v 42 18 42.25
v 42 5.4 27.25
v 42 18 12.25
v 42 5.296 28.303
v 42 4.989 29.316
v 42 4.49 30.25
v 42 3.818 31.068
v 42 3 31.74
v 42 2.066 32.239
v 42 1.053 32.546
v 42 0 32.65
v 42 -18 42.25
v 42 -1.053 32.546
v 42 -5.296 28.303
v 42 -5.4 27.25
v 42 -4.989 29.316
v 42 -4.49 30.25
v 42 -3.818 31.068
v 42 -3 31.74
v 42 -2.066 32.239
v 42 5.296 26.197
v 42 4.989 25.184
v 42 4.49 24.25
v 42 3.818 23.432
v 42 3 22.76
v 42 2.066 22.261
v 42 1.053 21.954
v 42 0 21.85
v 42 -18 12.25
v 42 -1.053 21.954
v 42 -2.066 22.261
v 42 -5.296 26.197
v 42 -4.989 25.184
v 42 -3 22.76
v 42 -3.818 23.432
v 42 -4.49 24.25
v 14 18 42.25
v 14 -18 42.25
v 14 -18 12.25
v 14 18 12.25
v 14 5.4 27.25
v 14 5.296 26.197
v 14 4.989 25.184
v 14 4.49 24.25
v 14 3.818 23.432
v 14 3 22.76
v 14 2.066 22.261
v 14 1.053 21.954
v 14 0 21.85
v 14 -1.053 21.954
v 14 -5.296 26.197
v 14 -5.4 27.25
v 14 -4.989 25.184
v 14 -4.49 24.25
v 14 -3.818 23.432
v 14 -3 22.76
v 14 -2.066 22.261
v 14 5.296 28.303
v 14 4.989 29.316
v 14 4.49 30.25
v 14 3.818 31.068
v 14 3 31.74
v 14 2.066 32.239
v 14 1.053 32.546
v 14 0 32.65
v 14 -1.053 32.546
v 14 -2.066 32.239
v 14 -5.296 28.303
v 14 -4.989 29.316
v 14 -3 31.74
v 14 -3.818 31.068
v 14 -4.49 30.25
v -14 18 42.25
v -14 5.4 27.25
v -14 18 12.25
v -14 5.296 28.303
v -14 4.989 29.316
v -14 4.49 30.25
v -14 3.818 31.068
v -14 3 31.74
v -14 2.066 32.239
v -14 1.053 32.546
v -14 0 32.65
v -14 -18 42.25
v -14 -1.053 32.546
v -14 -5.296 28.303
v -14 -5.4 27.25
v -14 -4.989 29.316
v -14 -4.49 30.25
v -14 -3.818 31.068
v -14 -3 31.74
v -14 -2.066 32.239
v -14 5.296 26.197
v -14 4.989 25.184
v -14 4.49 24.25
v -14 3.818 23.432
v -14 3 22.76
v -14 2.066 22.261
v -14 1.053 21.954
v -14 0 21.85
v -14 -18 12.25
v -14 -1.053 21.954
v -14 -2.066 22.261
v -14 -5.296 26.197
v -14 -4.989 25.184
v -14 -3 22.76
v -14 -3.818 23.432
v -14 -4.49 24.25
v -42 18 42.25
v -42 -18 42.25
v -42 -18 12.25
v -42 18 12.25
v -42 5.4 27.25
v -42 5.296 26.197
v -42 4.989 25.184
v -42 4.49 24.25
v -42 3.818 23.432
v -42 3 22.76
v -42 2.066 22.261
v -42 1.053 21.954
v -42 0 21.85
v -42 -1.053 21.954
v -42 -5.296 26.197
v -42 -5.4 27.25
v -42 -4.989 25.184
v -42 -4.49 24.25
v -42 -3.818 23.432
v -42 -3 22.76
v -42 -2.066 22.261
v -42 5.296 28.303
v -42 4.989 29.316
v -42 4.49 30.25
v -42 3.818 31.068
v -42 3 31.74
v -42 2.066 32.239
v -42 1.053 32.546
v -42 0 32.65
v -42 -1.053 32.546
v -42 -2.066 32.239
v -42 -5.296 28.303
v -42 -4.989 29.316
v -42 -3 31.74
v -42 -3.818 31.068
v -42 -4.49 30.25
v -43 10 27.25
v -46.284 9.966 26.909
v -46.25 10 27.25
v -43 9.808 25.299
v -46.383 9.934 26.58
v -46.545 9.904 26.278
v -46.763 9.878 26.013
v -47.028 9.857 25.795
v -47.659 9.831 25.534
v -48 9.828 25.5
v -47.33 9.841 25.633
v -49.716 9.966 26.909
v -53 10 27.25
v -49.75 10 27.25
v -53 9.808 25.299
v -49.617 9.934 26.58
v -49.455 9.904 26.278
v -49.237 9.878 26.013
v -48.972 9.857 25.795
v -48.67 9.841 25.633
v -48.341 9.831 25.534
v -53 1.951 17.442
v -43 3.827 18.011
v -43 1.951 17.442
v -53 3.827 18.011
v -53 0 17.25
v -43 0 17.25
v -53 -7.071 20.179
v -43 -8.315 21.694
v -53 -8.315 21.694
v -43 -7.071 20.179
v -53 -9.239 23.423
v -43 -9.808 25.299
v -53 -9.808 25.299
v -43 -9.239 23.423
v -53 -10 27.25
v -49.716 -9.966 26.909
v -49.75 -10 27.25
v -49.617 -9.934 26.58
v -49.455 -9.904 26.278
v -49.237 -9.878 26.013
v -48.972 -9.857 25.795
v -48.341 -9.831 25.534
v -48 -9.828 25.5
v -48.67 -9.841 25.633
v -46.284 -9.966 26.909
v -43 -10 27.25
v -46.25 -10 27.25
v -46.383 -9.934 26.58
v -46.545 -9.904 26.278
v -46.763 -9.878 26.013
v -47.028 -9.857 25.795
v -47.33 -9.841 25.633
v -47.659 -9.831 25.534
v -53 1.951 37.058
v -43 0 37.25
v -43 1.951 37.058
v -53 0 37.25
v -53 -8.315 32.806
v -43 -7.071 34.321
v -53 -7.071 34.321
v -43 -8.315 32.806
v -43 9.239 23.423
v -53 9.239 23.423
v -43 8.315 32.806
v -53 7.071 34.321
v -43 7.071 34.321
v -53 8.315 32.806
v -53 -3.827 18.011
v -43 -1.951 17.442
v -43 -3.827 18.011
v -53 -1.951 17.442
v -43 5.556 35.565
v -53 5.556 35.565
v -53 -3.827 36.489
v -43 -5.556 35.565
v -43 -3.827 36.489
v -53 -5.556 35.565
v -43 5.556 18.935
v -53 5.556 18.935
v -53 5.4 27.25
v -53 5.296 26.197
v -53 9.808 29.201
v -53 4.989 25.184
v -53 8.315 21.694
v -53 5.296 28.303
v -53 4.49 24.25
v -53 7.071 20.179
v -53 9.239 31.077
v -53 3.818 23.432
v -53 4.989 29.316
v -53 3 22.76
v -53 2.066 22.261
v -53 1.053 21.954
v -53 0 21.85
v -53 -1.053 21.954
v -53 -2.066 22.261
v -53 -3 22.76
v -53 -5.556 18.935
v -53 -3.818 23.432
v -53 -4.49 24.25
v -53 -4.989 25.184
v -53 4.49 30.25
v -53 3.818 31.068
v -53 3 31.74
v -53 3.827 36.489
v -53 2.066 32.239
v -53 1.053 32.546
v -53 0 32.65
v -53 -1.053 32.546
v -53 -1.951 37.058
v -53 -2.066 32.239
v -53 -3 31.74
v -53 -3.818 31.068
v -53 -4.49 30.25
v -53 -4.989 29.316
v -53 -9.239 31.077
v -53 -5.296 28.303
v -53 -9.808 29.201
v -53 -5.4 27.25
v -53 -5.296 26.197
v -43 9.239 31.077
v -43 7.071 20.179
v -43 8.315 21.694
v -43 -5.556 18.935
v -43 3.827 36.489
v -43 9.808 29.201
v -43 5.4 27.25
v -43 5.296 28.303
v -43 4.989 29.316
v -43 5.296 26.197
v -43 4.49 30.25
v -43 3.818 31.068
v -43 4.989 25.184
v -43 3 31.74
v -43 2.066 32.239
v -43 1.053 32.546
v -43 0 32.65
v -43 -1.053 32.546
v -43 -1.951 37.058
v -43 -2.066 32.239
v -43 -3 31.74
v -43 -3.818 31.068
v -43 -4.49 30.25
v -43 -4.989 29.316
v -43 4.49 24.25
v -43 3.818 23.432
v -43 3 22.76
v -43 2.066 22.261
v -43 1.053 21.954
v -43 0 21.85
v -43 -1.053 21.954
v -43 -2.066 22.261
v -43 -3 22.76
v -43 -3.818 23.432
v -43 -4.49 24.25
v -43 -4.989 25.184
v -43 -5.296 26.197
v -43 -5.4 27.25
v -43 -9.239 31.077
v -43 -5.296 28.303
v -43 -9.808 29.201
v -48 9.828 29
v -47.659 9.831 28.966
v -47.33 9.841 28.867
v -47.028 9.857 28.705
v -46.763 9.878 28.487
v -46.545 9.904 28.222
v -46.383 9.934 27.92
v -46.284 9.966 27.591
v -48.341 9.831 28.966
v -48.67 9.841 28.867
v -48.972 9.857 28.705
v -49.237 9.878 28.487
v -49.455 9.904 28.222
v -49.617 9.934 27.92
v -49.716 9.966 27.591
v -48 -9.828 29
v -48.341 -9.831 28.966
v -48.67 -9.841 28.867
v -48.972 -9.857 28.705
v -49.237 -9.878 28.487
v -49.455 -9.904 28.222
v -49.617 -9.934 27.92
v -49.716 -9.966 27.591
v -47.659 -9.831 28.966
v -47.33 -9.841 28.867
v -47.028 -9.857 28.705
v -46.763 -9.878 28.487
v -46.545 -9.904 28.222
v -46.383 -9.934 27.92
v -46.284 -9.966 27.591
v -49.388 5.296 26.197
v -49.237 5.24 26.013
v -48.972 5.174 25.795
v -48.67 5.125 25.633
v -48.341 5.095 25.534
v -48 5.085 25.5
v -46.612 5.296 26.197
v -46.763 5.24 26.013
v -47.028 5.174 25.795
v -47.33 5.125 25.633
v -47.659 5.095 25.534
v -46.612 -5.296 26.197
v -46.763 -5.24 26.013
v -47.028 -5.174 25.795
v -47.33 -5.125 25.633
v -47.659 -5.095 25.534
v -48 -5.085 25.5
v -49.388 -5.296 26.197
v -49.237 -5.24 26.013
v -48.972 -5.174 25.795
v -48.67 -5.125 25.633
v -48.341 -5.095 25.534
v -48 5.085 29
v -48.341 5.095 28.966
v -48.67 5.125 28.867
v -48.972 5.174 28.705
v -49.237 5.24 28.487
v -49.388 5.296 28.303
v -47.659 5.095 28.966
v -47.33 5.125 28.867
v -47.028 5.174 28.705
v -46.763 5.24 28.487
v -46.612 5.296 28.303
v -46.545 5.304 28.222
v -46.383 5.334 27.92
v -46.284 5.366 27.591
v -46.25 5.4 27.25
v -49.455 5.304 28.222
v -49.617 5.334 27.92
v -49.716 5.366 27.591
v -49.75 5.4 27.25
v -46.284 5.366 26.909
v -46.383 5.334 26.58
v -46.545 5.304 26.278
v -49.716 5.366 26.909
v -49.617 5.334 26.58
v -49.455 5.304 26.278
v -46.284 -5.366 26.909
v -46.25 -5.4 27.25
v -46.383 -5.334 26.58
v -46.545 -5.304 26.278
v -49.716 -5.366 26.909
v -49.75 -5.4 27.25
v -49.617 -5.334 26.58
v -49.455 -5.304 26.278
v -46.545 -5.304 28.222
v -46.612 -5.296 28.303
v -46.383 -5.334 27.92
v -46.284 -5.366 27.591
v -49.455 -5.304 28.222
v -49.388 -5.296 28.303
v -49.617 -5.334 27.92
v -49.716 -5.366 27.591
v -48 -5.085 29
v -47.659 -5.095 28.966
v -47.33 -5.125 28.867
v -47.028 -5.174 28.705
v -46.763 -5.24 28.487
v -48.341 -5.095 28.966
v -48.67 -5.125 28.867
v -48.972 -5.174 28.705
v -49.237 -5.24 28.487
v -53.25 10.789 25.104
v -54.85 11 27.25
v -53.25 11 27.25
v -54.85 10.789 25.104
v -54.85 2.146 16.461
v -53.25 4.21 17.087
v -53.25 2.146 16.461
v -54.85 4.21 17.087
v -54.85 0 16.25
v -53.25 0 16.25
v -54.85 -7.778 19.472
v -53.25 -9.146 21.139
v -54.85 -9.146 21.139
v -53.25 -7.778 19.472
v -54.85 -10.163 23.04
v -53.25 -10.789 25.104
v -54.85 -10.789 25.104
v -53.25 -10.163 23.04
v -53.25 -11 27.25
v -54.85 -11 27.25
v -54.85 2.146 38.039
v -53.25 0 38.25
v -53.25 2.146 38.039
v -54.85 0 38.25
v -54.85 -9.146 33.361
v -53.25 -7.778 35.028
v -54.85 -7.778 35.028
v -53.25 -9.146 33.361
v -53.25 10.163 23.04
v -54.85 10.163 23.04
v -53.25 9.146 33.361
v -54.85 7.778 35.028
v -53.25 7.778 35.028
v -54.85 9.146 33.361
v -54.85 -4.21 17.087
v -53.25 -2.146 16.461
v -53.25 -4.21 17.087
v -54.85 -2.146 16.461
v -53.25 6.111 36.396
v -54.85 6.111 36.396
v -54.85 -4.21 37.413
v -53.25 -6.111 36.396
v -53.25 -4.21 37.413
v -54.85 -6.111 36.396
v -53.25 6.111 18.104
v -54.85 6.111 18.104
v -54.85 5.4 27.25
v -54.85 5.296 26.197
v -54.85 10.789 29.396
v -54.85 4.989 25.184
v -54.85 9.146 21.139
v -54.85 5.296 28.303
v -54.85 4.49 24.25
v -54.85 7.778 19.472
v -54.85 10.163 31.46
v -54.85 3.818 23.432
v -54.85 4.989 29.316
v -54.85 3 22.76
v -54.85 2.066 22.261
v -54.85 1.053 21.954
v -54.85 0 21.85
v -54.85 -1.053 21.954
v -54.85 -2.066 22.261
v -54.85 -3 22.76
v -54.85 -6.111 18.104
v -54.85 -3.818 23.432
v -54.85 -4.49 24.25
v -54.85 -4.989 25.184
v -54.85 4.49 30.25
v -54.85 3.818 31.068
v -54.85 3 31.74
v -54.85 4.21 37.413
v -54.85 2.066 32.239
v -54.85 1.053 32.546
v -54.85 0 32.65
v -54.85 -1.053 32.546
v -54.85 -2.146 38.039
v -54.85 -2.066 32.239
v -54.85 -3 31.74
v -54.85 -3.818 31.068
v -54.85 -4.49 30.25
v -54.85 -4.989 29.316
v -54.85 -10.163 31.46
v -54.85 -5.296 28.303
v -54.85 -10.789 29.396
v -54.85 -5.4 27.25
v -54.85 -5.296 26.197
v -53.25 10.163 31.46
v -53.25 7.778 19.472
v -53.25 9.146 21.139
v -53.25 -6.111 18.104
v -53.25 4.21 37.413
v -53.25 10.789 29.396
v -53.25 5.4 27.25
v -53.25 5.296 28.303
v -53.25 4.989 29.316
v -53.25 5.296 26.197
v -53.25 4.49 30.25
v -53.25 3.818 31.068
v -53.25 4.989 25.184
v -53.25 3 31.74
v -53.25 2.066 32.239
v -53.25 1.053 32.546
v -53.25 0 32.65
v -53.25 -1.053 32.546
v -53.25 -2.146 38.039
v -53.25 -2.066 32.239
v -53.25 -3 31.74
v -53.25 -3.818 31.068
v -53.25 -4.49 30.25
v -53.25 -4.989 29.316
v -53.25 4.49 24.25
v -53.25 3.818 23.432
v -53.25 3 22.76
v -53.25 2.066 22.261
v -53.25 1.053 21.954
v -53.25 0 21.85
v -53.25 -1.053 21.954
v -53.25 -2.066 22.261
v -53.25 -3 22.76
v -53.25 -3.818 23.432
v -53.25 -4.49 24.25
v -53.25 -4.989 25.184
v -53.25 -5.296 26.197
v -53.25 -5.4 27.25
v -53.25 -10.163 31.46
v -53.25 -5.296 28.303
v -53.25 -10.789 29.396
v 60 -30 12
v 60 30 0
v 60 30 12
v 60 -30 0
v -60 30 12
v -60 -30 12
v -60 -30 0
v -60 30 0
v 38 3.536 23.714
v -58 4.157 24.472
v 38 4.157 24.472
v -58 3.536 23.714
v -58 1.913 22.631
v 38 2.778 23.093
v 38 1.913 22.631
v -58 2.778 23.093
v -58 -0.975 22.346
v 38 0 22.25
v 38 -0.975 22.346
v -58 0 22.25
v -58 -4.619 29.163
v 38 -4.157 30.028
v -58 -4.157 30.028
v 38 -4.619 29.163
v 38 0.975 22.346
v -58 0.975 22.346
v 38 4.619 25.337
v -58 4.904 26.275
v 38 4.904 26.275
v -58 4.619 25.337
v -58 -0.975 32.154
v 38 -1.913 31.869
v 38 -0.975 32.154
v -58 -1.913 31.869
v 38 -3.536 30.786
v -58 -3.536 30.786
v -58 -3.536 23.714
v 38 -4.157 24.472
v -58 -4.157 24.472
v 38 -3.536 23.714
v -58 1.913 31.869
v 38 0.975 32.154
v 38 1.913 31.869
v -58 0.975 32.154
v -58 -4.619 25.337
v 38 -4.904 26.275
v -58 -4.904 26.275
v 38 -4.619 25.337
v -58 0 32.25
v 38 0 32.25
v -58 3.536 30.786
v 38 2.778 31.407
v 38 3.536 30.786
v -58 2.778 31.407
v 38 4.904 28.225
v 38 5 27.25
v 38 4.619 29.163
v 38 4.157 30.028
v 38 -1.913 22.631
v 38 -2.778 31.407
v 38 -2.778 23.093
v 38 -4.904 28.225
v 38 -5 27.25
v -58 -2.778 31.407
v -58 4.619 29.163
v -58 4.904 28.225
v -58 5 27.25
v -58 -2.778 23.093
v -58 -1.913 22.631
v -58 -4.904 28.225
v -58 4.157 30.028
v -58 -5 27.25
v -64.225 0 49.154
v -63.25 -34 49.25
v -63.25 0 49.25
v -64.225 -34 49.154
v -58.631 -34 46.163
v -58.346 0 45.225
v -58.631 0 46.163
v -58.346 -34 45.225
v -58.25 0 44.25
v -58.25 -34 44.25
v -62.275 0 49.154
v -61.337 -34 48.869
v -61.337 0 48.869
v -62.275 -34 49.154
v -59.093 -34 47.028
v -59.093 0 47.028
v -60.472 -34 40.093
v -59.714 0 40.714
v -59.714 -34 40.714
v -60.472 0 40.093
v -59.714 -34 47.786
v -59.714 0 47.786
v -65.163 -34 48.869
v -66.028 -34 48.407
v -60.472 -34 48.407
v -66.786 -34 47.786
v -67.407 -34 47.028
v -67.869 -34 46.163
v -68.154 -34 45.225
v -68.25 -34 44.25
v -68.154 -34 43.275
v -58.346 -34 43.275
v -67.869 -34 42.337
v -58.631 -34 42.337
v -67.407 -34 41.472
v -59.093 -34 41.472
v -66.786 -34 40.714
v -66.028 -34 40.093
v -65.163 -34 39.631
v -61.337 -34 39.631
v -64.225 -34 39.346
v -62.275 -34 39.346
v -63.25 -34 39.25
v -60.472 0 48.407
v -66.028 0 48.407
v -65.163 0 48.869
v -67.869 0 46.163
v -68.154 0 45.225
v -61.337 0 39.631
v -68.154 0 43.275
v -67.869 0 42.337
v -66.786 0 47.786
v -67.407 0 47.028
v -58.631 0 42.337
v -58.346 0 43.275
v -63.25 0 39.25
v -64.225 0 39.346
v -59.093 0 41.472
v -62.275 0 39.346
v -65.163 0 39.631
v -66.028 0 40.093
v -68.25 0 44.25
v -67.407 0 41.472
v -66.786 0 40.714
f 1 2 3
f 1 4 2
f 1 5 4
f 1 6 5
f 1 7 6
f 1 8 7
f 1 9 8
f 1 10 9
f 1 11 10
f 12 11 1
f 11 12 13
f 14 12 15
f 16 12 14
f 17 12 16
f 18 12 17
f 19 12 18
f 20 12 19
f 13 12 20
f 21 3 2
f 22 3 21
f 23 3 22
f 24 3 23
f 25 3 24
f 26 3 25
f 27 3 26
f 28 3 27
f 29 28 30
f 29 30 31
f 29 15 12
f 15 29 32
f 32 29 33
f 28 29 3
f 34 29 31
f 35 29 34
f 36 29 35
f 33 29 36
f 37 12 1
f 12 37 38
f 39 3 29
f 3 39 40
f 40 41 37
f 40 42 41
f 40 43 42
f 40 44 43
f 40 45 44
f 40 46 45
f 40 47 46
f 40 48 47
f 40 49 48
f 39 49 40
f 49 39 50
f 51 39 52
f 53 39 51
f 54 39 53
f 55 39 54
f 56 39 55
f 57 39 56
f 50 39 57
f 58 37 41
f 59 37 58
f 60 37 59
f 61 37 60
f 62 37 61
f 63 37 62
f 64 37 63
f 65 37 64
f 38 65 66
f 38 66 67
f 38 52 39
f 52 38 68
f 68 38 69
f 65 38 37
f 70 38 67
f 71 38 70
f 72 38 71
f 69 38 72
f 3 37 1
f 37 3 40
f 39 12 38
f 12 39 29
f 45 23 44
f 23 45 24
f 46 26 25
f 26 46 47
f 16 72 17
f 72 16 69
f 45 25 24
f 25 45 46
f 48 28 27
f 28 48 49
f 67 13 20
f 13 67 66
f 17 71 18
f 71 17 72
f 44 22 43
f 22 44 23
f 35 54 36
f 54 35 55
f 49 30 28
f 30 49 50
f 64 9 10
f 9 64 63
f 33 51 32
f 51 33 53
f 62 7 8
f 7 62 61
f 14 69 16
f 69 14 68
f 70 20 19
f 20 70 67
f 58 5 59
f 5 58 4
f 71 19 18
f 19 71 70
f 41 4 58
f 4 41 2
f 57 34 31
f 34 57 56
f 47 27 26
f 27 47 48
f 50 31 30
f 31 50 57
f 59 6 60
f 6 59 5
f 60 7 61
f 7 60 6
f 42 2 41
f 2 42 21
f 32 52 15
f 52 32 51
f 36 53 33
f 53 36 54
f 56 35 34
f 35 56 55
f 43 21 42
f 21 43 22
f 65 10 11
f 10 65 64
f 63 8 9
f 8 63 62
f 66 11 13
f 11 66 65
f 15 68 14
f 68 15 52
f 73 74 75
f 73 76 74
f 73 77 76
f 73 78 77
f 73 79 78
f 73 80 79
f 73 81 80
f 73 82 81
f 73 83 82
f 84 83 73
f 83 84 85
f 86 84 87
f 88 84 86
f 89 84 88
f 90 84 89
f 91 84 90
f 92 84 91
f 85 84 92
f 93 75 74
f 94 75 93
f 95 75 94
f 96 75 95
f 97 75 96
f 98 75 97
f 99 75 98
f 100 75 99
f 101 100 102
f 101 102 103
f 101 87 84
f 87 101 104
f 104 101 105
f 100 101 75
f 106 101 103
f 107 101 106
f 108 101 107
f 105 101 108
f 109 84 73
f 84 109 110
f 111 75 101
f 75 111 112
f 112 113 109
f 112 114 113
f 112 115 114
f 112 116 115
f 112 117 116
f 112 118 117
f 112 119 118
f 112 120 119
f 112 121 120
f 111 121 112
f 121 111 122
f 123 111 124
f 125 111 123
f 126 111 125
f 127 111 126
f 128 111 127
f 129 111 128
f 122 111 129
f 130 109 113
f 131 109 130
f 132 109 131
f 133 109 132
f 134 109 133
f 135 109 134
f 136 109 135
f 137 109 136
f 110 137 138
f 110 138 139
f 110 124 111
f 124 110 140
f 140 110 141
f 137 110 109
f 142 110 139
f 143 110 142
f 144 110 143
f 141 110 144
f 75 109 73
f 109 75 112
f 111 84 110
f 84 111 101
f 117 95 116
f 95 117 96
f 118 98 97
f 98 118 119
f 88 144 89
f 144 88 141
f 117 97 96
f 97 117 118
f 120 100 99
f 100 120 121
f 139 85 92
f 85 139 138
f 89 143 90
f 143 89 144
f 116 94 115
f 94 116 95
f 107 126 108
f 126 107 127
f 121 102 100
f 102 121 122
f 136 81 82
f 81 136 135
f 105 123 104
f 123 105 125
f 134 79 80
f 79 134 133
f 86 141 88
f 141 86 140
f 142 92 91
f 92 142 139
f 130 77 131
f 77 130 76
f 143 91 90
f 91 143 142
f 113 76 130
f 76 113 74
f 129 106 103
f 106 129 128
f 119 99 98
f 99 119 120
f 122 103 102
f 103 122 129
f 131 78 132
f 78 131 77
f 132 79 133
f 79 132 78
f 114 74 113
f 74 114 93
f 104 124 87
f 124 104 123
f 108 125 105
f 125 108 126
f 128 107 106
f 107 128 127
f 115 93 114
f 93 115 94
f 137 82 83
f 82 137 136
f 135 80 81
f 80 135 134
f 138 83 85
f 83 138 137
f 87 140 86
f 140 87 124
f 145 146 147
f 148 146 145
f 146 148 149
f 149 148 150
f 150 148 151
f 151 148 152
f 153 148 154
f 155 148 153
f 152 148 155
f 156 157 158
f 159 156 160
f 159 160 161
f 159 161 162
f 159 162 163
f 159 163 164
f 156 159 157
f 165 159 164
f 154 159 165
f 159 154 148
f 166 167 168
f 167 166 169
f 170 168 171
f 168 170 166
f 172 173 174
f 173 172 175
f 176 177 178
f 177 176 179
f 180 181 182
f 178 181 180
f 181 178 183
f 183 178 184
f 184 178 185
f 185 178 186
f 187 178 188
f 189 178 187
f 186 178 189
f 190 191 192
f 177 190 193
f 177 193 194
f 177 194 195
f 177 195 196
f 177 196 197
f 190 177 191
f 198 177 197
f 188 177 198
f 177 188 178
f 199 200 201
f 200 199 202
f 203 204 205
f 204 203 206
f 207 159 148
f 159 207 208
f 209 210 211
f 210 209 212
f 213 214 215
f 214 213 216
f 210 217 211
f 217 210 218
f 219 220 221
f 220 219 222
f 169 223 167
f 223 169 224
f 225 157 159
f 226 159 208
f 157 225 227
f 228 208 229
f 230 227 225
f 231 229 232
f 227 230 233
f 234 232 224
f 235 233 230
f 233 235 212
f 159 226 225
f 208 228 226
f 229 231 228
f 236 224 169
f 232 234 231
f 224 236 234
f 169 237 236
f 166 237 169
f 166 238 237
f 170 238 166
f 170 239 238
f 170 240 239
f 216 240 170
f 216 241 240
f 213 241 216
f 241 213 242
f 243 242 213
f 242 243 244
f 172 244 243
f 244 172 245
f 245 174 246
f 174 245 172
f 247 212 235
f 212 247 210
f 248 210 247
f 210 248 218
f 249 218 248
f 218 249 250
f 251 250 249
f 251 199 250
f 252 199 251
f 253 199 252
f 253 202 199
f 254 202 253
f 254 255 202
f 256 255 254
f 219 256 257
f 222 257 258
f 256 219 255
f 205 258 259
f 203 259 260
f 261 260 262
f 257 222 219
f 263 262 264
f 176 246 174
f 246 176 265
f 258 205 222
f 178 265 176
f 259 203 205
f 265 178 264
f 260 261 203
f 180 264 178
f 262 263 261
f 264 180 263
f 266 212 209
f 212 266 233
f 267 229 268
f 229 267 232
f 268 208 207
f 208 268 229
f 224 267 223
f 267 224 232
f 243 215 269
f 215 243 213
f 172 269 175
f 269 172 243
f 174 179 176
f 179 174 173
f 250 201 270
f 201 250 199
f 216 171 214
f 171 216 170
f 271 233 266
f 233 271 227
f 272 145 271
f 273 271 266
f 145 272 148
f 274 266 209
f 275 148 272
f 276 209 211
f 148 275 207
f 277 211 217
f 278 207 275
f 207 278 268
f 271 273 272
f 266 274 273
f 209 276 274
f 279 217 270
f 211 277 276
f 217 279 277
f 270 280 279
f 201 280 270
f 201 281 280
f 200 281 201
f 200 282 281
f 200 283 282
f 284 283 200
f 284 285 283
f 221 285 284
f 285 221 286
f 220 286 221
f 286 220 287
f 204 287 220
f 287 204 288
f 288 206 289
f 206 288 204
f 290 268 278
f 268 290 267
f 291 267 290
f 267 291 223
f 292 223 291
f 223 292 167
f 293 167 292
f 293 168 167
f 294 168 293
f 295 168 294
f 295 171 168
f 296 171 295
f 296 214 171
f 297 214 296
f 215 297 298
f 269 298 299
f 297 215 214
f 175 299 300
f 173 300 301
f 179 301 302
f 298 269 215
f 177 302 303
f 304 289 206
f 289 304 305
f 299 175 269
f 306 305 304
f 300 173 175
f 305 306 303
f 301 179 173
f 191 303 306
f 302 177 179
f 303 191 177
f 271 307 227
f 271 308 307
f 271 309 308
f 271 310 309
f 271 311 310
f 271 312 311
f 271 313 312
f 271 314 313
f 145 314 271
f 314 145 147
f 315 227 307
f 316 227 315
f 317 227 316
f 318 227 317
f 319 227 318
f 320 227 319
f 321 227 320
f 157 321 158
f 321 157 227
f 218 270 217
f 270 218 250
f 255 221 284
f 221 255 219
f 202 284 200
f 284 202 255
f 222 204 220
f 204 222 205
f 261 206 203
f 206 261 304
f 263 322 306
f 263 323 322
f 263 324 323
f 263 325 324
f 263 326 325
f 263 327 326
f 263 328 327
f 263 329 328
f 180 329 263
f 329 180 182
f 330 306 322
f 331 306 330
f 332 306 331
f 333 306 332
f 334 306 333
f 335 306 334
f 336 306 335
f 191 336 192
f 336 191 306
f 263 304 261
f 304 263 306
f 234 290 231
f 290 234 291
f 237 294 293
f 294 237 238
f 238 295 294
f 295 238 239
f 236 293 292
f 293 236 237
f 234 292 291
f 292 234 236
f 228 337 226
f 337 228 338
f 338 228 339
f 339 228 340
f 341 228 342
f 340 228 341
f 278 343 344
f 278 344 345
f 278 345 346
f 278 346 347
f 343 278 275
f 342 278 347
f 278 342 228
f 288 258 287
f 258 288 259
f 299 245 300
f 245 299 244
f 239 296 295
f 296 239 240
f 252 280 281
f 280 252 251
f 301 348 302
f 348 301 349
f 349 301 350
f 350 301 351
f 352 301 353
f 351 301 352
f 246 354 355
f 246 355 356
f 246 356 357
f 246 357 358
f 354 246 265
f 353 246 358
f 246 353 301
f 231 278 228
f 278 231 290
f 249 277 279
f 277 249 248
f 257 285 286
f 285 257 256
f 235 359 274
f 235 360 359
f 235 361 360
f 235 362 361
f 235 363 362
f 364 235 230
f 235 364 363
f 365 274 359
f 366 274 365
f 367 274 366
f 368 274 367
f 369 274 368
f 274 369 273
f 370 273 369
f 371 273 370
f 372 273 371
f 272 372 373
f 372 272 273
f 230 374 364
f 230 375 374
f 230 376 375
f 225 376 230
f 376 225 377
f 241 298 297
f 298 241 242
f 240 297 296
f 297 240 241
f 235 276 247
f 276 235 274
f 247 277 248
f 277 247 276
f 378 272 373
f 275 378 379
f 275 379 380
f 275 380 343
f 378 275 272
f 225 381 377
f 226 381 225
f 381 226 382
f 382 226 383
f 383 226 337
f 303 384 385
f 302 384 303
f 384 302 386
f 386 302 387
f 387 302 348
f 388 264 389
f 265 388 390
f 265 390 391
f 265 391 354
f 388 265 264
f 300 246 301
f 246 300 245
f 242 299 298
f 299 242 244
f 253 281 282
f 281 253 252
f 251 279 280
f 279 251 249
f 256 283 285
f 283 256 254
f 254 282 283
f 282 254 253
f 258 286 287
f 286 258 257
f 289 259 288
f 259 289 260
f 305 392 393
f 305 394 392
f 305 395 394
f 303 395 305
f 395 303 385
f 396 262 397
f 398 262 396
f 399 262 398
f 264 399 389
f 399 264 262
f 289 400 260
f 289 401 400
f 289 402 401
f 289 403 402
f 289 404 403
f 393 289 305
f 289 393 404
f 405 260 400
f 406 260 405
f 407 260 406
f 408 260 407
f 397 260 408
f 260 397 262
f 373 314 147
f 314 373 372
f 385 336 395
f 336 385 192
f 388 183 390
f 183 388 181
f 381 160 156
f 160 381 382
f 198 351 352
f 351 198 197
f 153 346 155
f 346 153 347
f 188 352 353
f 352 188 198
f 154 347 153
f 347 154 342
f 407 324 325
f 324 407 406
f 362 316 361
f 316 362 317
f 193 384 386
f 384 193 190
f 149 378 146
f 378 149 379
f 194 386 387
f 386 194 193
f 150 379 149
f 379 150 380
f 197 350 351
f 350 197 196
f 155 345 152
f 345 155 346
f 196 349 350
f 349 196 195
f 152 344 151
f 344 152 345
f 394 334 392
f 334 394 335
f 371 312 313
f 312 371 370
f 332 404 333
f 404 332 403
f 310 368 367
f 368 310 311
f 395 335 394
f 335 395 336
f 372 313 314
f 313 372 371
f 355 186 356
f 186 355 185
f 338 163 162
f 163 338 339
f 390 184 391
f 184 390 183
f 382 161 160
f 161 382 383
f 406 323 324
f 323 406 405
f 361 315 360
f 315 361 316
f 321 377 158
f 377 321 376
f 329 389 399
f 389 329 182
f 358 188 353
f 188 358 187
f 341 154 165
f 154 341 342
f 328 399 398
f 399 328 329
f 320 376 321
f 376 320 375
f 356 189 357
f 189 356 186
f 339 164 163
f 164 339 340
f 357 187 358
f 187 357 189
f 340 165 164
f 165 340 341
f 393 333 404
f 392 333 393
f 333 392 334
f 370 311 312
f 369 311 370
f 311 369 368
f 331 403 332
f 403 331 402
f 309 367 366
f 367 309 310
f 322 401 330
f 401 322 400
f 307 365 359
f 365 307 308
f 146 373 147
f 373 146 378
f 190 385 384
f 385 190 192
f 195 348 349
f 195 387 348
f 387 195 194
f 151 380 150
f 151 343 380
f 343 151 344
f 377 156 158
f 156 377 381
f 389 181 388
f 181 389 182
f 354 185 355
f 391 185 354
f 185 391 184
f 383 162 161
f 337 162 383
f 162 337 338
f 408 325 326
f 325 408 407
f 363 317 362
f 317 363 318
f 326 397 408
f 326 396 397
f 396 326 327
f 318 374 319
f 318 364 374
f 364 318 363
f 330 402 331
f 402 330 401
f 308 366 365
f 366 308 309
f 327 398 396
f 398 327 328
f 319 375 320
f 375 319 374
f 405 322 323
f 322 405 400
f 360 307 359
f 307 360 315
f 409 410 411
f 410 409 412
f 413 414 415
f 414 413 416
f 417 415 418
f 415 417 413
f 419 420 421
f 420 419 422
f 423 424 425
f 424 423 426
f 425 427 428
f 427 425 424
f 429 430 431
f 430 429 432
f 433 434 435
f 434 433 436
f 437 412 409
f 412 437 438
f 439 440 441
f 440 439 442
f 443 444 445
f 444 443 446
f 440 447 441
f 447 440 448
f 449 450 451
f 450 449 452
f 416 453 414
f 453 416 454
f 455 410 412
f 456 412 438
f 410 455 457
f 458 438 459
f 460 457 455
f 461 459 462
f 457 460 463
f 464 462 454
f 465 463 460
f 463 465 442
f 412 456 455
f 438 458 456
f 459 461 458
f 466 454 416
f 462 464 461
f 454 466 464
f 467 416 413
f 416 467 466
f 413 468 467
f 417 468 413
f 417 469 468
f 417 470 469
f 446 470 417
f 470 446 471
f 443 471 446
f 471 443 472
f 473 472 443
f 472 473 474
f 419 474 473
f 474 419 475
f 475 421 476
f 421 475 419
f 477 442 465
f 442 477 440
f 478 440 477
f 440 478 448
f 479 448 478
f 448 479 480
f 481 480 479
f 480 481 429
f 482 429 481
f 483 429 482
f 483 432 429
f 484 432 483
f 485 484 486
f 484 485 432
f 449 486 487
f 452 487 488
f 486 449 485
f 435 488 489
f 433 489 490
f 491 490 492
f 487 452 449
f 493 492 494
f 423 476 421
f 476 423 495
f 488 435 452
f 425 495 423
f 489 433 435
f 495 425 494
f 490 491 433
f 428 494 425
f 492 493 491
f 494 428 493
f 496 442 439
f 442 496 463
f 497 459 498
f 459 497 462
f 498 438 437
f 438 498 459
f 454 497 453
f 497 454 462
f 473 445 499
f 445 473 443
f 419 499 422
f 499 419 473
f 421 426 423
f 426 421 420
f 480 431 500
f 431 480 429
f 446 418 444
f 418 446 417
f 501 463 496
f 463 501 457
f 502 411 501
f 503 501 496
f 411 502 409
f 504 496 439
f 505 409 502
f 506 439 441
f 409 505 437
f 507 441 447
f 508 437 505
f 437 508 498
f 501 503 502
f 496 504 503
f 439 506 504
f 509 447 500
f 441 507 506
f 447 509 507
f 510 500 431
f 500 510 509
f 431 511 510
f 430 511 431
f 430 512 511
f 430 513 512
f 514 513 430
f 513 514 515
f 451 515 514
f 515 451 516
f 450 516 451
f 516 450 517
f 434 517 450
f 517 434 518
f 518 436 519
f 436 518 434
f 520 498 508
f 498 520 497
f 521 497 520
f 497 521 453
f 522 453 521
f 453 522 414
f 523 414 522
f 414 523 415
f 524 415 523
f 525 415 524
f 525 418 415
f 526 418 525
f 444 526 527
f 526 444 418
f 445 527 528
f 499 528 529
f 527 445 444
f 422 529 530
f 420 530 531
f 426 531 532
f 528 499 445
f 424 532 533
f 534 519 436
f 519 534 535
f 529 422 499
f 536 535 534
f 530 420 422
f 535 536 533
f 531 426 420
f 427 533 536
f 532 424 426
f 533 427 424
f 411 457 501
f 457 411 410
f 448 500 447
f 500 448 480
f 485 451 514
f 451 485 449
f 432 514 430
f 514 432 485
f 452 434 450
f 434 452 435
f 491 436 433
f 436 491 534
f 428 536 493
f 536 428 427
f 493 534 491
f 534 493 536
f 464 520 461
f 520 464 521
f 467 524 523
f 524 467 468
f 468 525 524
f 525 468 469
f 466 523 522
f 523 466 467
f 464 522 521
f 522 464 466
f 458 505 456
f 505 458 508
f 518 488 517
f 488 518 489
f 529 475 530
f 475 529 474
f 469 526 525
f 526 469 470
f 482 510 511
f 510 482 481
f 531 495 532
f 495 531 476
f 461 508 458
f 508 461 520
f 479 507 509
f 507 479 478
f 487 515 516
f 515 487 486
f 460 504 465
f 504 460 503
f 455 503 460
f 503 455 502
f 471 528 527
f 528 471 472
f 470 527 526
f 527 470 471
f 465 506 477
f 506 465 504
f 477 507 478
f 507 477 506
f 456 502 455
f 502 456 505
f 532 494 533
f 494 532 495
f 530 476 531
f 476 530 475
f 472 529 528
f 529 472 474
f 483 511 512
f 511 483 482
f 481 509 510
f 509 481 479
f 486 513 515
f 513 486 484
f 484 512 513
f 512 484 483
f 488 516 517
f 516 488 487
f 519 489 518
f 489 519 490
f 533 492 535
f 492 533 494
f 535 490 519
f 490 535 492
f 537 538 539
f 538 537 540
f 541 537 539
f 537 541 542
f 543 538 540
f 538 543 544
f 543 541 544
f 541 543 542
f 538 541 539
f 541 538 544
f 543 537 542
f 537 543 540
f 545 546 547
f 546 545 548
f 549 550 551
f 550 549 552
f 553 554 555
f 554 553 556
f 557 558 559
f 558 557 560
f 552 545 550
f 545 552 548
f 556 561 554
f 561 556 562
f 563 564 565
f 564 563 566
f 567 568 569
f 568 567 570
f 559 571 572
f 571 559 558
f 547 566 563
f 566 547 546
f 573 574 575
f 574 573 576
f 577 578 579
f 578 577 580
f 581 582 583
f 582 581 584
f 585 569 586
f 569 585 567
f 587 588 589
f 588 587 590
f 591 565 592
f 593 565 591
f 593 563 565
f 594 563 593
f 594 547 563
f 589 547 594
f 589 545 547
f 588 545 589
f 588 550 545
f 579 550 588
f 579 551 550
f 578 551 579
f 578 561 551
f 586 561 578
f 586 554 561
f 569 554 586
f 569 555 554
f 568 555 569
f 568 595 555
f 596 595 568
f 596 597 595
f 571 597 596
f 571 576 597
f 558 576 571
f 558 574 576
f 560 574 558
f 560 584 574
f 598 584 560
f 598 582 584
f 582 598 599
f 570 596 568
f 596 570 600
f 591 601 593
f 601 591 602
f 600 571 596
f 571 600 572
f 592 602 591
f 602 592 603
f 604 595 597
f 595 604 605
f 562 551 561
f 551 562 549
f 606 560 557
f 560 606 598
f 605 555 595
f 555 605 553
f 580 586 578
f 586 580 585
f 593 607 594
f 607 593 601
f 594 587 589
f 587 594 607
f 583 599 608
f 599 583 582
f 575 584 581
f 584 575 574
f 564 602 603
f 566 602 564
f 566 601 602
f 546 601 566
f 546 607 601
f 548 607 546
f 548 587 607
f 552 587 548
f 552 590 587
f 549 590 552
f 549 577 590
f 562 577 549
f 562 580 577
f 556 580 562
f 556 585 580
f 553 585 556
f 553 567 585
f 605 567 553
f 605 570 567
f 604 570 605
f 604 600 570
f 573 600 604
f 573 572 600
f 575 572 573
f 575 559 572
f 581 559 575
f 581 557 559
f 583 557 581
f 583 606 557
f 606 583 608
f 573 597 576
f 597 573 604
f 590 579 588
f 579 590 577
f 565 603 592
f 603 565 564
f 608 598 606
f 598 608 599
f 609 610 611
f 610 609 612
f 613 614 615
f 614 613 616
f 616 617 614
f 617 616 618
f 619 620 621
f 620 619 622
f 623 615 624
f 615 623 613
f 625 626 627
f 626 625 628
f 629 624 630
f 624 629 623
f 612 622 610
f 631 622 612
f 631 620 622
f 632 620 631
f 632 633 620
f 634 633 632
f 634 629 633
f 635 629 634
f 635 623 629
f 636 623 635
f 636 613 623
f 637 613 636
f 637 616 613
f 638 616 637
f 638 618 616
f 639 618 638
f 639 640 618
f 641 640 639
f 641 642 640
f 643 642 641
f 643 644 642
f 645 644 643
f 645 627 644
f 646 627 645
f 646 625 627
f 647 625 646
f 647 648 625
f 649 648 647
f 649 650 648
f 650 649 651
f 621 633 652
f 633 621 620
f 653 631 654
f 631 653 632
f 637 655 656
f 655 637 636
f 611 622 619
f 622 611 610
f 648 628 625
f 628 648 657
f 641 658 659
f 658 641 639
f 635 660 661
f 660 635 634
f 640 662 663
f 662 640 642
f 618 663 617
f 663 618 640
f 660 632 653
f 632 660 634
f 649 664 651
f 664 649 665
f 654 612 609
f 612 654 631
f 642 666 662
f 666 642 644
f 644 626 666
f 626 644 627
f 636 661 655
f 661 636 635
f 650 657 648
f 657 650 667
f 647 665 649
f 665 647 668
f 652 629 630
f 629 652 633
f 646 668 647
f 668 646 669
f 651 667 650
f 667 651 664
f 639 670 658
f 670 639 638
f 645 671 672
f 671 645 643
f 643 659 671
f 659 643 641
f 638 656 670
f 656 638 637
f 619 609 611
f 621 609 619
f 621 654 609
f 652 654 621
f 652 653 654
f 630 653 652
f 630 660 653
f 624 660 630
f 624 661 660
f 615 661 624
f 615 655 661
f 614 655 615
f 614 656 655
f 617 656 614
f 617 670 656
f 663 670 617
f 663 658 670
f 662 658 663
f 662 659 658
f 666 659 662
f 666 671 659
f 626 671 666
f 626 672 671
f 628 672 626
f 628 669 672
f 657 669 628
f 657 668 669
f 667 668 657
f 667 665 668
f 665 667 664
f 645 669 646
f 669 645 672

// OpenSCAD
$fn = 32;

// ------------------------------------------------------------------------
// Machine vise: screw d10, jaws 28 x 30 mm
// Every part is its own module, assembly() places every instance.
// ------------------------------------------------------------------------

// --- part 1 ---
module vise_bed() {
  difference() {
    translate([-60, -30, 0]) cube([120, 60, 12]);
  }
}

// --- part 2 ---
module vise_jaw() {
  difference() {
    translate([-14, -18, 0]) cube([28, 36, 30]);
    translate([0, 0, 15]) rotate([0, 90, 0]) cylinder(h = 30, d = 10.8, center = true);
  }
}

// --- part 3 ---
module vise_screw() {
  translate([0, 0, -48]) cylinder(h = 96, d = 10);
}

// --- part 4 ---
module screw_collar() {
  difference() {
    cylinder(h = 10, d = 20);
    translate([0, 0, -1]) cylinder(h = 12, d = 10.8);
    translate([0, 0, 5]) rotate([90, 0, 0]) cylinder(h = 22, d = 3.5, center = true);
  }
}

// --- part 5 ---
module screw_washer() {
  difference() {
      translate([0, 0, 0]) cylinder(h = 1.6, d = 22);
      translate([0, 0, -1]) cylinder(h = 3.6, d = 10.8);
    }
}

// --- part 6 ---
module vise_handle() {
  cylinder(h = 34, d = 10);
}

// --- assembly ---
module assembly() {
  color([0.80, 0.24, 0.20]) translate([0, 0, 0]) rotate([0, 0, 0]) vise_bed();
  color([0.20, 0.45, 0.75]) translate([28, 0, 12.25]) rotate([0, 0, 0]) vise_jaw();
  color([0.25, 0.62, 0.32]) translate([-28, 0, 12.25]) rotate([0, 0, 0]) vise_jaw();
  color([0.92, 0.70, 0.18]) translate([-10, 0, 27.25]) rotate([0, 90, 0]) vise_screw();
  color([0.58, 0.35, 0.70]) translate([-53, 0, 27.25]) rotate([0, 90, 0]) screw_collar();
  color([0.16, 0.66, 0.66]) translate([-54.85, 0, 27.25]) rotate([0, 90, 0]) screw_washer();
  color([0.85, 0.48, 0.18]) translate([-63.25, 0, 44.25]) rotate([90, 0, 0]) vise_handle();
}

assembly();
